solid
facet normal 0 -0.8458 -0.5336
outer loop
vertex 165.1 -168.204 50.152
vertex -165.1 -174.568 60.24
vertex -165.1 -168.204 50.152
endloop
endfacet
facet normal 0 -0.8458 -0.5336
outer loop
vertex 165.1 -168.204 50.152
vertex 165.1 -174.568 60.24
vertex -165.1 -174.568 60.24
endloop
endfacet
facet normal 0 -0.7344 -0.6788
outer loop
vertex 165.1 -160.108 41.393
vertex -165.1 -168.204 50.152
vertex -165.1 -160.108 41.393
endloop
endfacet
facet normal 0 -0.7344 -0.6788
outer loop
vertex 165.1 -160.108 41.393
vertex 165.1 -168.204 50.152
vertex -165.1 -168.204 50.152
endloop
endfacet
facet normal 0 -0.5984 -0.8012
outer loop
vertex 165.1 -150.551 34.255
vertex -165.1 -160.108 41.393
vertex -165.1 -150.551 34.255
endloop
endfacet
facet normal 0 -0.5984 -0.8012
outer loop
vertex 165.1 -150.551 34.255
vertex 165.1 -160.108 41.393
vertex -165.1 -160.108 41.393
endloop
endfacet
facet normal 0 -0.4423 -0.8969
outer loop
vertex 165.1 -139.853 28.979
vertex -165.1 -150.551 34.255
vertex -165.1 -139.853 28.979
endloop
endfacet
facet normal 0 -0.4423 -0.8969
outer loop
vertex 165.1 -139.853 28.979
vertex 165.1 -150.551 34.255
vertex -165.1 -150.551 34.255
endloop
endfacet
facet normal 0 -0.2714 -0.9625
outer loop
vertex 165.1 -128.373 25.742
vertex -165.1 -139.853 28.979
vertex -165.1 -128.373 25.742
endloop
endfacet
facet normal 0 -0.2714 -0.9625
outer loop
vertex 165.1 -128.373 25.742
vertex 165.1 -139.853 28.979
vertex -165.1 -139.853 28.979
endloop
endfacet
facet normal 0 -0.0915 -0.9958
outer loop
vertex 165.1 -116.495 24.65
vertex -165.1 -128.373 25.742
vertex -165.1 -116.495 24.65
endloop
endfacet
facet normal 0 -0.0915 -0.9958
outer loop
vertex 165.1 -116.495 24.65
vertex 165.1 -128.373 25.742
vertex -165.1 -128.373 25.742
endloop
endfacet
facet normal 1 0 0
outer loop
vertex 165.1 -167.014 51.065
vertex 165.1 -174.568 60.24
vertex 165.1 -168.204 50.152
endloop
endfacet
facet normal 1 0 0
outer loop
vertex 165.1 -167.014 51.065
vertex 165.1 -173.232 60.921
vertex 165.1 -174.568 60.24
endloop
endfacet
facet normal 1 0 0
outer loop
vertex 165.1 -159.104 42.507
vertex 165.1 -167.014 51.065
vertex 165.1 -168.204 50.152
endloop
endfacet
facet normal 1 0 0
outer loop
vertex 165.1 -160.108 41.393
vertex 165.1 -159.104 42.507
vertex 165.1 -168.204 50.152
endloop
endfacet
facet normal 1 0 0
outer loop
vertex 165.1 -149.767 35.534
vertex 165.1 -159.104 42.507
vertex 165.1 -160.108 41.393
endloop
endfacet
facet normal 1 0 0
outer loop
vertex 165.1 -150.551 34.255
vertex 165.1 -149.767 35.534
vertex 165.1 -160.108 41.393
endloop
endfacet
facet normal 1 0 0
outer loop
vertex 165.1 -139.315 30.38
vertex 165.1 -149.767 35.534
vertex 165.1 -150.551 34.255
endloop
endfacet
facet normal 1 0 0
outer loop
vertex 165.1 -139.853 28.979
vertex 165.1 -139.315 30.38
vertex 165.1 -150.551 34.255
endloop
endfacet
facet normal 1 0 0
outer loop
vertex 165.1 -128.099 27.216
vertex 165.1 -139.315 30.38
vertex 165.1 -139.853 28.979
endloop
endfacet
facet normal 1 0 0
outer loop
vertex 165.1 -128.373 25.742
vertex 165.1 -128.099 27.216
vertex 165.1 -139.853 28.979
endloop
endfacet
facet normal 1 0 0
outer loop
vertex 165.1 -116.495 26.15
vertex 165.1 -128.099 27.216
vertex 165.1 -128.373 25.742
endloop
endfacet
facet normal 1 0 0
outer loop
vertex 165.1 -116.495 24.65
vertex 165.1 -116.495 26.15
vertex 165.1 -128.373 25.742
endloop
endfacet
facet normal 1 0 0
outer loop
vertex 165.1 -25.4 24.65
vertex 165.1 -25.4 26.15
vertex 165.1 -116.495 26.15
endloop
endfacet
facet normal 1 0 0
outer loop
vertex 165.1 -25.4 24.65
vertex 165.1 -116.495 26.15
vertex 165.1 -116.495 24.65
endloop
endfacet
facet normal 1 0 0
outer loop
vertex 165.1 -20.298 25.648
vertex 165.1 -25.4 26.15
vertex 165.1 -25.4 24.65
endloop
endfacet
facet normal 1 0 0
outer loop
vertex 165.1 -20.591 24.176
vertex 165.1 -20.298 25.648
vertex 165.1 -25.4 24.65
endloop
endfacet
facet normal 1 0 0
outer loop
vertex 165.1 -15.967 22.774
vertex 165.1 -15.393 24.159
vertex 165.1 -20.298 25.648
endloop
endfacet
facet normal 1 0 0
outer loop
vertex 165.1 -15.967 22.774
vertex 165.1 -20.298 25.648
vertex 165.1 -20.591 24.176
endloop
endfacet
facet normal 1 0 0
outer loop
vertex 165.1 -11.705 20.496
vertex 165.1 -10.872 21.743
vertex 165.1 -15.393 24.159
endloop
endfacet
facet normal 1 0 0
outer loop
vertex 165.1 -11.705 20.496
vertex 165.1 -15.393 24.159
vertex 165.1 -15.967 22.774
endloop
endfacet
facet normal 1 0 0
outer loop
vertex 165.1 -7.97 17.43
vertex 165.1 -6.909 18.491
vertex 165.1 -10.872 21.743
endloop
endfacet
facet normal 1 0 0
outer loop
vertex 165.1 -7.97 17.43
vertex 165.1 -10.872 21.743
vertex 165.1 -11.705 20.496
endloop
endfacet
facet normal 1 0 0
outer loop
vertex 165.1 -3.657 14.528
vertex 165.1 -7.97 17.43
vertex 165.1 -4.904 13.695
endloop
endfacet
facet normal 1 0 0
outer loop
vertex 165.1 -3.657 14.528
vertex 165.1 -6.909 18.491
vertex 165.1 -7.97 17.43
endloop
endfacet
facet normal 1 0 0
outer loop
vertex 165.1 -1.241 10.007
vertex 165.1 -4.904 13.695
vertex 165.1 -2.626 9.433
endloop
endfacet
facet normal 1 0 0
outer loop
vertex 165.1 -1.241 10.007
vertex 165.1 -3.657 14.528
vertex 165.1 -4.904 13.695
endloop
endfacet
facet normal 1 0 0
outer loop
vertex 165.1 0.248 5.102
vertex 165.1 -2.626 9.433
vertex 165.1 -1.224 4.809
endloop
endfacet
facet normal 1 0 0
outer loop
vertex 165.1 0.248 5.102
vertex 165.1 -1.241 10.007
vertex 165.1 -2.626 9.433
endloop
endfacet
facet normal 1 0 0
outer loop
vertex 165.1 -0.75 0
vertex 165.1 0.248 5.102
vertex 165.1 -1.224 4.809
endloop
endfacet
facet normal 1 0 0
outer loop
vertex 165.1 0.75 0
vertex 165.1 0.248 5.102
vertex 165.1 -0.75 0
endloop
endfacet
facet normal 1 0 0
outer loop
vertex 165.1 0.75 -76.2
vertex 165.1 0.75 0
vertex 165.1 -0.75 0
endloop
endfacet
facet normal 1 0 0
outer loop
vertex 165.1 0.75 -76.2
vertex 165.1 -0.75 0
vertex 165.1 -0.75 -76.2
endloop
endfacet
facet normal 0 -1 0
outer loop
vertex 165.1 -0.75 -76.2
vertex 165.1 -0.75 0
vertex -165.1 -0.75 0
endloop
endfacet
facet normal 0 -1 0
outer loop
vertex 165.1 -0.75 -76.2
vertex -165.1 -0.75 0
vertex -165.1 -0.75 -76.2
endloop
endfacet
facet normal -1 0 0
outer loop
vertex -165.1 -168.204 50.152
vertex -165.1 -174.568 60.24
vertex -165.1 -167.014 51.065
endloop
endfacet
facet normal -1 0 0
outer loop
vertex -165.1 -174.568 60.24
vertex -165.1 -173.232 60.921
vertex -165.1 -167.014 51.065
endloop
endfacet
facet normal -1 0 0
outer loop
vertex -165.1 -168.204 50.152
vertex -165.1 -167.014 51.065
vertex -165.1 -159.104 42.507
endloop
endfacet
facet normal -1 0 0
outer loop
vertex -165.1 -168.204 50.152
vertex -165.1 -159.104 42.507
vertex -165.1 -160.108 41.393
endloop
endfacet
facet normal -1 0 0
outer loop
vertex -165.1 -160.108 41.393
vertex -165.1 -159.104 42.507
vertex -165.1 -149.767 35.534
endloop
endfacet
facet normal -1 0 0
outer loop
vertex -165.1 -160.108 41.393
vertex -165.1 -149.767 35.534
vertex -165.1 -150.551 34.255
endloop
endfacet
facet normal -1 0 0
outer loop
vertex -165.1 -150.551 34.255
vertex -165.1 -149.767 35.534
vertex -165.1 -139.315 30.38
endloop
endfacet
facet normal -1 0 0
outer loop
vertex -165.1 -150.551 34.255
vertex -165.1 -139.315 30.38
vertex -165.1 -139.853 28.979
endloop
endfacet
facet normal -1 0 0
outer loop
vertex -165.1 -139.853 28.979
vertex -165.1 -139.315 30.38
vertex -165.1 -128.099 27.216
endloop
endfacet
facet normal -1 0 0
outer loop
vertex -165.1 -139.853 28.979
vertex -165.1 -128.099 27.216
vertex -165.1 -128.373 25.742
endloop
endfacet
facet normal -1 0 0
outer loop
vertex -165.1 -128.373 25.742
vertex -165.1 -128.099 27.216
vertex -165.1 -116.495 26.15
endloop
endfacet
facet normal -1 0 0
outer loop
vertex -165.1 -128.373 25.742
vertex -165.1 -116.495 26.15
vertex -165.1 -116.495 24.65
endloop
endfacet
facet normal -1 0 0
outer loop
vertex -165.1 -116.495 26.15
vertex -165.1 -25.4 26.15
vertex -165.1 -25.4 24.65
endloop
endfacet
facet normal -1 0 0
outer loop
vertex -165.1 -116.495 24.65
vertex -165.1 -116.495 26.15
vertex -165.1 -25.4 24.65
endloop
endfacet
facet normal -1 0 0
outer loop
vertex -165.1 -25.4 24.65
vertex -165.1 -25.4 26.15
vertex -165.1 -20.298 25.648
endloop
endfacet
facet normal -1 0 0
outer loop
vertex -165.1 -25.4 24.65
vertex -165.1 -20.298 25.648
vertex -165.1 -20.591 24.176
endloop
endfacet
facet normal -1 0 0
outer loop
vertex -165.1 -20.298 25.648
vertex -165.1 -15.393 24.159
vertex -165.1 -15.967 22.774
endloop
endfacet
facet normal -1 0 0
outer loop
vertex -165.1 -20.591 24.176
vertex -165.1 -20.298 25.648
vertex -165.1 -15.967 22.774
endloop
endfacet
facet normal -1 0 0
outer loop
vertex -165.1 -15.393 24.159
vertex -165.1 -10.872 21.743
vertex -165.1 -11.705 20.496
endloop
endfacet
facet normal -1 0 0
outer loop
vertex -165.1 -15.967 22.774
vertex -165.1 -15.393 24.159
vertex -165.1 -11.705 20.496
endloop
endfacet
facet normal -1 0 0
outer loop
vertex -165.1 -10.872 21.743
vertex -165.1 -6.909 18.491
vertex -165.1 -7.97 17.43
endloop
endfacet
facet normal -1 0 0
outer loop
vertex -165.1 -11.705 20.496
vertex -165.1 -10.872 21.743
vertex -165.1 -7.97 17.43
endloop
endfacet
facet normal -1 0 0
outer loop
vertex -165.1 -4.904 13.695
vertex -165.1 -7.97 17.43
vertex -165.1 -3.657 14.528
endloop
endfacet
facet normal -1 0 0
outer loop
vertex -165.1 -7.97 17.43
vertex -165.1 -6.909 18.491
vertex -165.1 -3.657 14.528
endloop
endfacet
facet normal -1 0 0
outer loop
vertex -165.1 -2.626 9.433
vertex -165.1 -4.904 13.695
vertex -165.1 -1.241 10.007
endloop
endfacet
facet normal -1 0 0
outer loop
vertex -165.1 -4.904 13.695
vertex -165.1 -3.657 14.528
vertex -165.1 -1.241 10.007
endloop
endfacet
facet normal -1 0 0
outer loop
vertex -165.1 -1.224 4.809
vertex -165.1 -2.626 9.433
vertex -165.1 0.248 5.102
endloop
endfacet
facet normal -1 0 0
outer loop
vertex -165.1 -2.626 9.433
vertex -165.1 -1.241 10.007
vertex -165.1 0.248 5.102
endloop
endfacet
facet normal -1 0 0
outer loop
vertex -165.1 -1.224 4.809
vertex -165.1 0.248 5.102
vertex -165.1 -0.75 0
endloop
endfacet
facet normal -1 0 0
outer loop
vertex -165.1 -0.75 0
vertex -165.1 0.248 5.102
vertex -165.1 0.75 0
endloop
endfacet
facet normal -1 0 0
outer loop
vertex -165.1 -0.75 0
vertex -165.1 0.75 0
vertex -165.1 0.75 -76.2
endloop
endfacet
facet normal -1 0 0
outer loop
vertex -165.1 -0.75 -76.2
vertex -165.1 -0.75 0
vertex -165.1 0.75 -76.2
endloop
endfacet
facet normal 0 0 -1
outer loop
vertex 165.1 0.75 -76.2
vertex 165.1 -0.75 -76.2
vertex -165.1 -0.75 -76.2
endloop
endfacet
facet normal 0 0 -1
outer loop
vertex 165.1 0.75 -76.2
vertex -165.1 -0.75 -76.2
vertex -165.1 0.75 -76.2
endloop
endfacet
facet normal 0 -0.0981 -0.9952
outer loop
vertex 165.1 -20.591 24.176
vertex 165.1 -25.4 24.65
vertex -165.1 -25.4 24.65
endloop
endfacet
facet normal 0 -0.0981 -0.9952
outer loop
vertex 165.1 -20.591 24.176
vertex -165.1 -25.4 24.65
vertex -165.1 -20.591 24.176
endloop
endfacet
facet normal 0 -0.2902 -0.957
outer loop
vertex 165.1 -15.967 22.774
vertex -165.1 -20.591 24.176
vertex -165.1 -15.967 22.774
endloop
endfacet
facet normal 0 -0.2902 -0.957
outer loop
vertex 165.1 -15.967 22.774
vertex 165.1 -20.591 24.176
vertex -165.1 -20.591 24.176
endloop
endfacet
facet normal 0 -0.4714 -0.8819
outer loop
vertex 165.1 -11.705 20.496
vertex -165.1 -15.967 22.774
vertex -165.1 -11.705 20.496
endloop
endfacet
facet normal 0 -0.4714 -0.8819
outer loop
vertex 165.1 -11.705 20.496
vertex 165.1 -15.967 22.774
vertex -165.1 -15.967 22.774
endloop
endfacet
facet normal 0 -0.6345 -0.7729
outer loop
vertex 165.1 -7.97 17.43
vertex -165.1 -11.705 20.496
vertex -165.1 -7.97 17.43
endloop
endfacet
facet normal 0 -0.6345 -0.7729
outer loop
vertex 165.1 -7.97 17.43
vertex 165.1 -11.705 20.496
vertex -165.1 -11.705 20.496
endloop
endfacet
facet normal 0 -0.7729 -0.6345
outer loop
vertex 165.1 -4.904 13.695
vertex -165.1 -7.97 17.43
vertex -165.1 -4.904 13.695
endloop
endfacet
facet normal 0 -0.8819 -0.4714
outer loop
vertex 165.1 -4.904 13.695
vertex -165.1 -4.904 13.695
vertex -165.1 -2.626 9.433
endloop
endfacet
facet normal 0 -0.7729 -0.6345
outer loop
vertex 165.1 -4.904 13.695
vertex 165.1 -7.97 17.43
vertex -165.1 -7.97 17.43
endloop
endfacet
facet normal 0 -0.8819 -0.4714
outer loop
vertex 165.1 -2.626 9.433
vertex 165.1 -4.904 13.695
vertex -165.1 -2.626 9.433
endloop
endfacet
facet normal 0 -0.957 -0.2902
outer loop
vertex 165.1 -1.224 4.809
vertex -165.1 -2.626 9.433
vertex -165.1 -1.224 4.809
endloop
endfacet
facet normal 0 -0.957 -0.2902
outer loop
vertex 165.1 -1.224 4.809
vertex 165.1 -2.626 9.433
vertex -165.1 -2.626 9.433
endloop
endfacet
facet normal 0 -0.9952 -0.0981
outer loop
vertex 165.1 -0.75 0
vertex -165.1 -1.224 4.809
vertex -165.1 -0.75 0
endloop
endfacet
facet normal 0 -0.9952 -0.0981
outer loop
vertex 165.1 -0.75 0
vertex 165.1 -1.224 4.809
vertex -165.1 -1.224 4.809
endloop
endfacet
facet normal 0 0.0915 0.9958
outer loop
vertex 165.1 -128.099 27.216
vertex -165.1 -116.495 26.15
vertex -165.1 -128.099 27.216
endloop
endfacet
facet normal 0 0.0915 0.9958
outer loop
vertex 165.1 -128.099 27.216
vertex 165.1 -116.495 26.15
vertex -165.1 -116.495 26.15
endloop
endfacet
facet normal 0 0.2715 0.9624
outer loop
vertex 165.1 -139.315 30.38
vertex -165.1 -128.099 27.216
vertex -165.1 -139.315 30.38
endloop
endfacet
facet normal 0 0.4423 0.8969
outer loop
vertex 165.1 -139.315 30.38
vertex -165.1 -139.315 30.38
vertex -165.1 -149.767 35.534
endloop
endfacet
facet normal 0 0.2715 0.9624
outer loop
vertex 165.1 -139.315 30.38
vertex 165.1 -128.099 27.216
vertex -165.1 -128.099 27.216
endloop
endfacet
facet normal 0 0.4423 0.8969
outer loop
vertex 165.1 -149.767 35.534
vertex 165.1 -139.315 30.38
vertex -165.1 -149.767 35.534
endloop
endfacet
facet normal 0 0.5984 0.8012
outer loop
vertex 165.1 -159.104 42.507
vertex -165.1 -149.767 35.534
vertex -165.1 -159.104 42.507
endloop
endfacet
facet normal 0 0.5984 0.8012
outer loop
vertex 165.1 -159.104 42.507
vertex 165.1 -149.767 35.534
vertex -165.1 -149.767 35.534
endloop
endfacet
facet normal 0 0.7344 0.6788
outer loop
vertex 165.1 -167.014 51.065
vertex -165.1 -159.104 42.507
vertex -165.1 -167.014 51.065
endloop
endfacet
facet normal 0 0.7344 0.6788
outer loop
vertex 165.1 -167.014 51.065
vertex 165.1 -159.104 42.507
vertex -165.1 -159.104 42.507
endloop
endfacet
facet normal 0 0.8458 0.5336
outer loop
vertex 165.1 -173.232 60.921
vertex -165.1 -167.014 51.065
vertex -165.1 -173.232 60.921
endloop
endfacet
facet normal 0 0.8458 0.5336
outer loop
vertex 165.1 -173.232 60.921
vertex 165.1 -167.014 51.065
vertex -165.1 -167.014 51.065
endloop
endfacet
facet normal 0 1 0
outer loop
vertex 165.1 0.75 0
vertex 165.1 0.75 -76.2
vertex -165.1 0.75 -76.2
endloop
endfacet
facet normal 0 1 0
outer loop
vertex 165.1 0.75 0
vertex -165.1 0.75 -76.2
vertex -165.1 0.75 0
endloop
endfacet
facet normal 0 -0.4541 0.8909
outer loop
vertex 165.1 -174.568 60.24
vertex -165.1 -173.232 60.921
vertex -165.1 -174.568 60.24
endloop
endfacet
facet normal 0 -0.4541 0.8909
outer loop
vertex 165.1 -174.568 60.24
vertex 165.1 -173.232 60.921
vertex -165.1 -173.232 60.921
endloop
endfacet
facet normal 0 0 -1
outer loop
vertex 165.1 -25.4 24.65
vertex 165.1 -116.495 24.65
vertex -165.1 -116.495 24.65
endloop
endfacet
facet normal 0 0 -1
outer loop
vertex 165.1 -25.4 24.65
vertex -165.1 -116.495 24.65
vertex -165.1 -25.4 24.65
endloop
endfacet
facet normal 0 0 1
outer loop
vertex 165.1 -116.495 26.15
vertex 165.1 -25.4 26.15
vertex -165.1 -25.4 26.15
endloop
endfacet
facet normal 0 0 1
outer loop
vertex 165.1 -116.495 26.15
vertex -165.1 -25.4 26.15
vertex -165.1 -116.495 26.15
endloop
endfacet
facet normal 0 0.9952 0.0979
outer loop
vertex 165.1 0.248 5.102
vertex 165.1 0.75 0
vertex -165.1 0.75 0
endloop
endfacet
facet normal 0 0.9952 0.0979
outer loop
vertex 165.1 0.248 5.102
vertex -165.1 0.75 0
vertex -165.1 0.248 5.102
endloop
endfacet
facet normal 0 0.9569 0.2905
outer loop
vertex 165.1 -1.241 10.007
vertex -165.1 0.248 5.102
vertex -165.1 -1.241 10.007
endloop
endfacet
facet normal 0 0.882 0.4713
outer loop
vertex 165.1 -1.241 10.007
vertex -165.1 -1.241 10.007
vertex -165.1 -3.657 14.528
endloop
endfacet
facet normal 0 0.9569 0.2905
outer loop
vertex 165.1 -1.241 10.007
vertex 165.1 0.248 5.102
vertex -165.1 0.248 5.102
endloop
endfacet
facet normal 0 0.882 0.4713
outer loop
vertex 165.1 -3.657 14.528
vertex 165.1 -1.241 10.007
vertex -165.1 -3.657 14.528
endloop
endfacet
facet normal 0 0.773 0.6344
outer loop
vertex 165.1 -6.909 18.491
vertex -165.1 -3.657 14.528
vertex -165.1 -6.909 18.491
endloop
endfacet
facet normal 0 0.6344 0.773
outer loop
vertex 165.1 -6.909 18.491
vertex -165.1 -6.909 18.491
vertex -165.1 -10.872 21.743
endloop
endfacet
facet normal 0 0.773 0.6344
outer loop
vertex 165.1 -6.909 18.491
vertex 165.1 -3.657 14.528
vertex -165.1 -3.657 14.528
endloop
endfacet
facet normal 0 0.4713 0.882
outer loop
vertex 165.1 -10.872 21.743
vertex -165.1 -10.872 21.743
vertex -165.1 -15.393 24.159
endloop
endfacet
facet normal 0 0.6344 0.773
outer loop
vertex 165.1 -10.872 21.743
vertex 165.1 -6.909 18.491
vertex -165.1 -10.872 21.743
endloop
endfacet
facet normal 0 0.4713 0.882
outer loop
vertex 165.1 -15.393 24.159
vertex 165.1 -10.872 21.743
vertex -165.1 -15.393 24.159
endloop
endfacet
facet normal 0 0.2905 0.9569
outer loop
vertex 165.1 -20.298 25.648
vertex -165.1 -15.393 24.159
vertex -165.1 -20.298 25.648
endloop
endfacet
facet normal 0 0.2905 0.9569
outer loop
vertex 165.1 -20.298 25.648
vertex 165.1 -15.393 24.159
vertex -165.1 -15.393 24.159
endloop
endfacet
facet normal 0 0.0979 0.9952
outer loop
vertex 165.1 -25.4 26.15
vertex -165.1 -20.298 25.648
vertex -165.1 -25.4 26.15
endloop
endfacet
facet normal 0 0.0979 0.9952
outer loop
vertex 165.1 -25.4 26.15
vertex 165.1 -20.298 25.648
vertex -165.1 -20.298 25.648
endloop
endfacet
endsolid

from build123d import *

# Parameters (mm, degrees)
EXTRUDE_THIN1_DEPTH = 165.1


with BuildPart() as part:
    # Sketch2 → Extrude-Thin1 (new body, symmetric)
    with BuildSketch(Plane(origin=(0, 0, 0), x_dir=(0, 0, -1), z_dir=(1, 0, 0))):
        with BuildLine():
            ThreePointArc((-60.240298086, -174.5682791), (-34.255387925, -150.550644745), (-24.65, -116.494825288))
            Line((-24.65, -116.494825288), (-24.65, -25.4))
            ThreePointArc((-24.65, -25.4), (-17.430182156, -7.969817844), (0, -0.75))
            Line((0, -0.75), (76.2, -0.75))
            Line((76.2, -0.75), (76.2, 0.75))
            Line((76.2, 0.75), (0, 0.75))
            ThreePointArc((0, 0.75), (-18.490842328, -6.909157672), (-26.15, -25.4))
            Line((-26.15, -25.4), (-26.15, -116.494825288))
            ThreePointArc((-26.15, -116.494825288), (-35.534320309, -149.766851432), (-60.921188809, -173.2317209))
            Line((-60.921188809, -173.2317209), (-60.240298086, -174.5682791))
        make_face()
    extrude(amount=EXTRUDE_THIN1_DEPTH, both=True)


solid = part.part
